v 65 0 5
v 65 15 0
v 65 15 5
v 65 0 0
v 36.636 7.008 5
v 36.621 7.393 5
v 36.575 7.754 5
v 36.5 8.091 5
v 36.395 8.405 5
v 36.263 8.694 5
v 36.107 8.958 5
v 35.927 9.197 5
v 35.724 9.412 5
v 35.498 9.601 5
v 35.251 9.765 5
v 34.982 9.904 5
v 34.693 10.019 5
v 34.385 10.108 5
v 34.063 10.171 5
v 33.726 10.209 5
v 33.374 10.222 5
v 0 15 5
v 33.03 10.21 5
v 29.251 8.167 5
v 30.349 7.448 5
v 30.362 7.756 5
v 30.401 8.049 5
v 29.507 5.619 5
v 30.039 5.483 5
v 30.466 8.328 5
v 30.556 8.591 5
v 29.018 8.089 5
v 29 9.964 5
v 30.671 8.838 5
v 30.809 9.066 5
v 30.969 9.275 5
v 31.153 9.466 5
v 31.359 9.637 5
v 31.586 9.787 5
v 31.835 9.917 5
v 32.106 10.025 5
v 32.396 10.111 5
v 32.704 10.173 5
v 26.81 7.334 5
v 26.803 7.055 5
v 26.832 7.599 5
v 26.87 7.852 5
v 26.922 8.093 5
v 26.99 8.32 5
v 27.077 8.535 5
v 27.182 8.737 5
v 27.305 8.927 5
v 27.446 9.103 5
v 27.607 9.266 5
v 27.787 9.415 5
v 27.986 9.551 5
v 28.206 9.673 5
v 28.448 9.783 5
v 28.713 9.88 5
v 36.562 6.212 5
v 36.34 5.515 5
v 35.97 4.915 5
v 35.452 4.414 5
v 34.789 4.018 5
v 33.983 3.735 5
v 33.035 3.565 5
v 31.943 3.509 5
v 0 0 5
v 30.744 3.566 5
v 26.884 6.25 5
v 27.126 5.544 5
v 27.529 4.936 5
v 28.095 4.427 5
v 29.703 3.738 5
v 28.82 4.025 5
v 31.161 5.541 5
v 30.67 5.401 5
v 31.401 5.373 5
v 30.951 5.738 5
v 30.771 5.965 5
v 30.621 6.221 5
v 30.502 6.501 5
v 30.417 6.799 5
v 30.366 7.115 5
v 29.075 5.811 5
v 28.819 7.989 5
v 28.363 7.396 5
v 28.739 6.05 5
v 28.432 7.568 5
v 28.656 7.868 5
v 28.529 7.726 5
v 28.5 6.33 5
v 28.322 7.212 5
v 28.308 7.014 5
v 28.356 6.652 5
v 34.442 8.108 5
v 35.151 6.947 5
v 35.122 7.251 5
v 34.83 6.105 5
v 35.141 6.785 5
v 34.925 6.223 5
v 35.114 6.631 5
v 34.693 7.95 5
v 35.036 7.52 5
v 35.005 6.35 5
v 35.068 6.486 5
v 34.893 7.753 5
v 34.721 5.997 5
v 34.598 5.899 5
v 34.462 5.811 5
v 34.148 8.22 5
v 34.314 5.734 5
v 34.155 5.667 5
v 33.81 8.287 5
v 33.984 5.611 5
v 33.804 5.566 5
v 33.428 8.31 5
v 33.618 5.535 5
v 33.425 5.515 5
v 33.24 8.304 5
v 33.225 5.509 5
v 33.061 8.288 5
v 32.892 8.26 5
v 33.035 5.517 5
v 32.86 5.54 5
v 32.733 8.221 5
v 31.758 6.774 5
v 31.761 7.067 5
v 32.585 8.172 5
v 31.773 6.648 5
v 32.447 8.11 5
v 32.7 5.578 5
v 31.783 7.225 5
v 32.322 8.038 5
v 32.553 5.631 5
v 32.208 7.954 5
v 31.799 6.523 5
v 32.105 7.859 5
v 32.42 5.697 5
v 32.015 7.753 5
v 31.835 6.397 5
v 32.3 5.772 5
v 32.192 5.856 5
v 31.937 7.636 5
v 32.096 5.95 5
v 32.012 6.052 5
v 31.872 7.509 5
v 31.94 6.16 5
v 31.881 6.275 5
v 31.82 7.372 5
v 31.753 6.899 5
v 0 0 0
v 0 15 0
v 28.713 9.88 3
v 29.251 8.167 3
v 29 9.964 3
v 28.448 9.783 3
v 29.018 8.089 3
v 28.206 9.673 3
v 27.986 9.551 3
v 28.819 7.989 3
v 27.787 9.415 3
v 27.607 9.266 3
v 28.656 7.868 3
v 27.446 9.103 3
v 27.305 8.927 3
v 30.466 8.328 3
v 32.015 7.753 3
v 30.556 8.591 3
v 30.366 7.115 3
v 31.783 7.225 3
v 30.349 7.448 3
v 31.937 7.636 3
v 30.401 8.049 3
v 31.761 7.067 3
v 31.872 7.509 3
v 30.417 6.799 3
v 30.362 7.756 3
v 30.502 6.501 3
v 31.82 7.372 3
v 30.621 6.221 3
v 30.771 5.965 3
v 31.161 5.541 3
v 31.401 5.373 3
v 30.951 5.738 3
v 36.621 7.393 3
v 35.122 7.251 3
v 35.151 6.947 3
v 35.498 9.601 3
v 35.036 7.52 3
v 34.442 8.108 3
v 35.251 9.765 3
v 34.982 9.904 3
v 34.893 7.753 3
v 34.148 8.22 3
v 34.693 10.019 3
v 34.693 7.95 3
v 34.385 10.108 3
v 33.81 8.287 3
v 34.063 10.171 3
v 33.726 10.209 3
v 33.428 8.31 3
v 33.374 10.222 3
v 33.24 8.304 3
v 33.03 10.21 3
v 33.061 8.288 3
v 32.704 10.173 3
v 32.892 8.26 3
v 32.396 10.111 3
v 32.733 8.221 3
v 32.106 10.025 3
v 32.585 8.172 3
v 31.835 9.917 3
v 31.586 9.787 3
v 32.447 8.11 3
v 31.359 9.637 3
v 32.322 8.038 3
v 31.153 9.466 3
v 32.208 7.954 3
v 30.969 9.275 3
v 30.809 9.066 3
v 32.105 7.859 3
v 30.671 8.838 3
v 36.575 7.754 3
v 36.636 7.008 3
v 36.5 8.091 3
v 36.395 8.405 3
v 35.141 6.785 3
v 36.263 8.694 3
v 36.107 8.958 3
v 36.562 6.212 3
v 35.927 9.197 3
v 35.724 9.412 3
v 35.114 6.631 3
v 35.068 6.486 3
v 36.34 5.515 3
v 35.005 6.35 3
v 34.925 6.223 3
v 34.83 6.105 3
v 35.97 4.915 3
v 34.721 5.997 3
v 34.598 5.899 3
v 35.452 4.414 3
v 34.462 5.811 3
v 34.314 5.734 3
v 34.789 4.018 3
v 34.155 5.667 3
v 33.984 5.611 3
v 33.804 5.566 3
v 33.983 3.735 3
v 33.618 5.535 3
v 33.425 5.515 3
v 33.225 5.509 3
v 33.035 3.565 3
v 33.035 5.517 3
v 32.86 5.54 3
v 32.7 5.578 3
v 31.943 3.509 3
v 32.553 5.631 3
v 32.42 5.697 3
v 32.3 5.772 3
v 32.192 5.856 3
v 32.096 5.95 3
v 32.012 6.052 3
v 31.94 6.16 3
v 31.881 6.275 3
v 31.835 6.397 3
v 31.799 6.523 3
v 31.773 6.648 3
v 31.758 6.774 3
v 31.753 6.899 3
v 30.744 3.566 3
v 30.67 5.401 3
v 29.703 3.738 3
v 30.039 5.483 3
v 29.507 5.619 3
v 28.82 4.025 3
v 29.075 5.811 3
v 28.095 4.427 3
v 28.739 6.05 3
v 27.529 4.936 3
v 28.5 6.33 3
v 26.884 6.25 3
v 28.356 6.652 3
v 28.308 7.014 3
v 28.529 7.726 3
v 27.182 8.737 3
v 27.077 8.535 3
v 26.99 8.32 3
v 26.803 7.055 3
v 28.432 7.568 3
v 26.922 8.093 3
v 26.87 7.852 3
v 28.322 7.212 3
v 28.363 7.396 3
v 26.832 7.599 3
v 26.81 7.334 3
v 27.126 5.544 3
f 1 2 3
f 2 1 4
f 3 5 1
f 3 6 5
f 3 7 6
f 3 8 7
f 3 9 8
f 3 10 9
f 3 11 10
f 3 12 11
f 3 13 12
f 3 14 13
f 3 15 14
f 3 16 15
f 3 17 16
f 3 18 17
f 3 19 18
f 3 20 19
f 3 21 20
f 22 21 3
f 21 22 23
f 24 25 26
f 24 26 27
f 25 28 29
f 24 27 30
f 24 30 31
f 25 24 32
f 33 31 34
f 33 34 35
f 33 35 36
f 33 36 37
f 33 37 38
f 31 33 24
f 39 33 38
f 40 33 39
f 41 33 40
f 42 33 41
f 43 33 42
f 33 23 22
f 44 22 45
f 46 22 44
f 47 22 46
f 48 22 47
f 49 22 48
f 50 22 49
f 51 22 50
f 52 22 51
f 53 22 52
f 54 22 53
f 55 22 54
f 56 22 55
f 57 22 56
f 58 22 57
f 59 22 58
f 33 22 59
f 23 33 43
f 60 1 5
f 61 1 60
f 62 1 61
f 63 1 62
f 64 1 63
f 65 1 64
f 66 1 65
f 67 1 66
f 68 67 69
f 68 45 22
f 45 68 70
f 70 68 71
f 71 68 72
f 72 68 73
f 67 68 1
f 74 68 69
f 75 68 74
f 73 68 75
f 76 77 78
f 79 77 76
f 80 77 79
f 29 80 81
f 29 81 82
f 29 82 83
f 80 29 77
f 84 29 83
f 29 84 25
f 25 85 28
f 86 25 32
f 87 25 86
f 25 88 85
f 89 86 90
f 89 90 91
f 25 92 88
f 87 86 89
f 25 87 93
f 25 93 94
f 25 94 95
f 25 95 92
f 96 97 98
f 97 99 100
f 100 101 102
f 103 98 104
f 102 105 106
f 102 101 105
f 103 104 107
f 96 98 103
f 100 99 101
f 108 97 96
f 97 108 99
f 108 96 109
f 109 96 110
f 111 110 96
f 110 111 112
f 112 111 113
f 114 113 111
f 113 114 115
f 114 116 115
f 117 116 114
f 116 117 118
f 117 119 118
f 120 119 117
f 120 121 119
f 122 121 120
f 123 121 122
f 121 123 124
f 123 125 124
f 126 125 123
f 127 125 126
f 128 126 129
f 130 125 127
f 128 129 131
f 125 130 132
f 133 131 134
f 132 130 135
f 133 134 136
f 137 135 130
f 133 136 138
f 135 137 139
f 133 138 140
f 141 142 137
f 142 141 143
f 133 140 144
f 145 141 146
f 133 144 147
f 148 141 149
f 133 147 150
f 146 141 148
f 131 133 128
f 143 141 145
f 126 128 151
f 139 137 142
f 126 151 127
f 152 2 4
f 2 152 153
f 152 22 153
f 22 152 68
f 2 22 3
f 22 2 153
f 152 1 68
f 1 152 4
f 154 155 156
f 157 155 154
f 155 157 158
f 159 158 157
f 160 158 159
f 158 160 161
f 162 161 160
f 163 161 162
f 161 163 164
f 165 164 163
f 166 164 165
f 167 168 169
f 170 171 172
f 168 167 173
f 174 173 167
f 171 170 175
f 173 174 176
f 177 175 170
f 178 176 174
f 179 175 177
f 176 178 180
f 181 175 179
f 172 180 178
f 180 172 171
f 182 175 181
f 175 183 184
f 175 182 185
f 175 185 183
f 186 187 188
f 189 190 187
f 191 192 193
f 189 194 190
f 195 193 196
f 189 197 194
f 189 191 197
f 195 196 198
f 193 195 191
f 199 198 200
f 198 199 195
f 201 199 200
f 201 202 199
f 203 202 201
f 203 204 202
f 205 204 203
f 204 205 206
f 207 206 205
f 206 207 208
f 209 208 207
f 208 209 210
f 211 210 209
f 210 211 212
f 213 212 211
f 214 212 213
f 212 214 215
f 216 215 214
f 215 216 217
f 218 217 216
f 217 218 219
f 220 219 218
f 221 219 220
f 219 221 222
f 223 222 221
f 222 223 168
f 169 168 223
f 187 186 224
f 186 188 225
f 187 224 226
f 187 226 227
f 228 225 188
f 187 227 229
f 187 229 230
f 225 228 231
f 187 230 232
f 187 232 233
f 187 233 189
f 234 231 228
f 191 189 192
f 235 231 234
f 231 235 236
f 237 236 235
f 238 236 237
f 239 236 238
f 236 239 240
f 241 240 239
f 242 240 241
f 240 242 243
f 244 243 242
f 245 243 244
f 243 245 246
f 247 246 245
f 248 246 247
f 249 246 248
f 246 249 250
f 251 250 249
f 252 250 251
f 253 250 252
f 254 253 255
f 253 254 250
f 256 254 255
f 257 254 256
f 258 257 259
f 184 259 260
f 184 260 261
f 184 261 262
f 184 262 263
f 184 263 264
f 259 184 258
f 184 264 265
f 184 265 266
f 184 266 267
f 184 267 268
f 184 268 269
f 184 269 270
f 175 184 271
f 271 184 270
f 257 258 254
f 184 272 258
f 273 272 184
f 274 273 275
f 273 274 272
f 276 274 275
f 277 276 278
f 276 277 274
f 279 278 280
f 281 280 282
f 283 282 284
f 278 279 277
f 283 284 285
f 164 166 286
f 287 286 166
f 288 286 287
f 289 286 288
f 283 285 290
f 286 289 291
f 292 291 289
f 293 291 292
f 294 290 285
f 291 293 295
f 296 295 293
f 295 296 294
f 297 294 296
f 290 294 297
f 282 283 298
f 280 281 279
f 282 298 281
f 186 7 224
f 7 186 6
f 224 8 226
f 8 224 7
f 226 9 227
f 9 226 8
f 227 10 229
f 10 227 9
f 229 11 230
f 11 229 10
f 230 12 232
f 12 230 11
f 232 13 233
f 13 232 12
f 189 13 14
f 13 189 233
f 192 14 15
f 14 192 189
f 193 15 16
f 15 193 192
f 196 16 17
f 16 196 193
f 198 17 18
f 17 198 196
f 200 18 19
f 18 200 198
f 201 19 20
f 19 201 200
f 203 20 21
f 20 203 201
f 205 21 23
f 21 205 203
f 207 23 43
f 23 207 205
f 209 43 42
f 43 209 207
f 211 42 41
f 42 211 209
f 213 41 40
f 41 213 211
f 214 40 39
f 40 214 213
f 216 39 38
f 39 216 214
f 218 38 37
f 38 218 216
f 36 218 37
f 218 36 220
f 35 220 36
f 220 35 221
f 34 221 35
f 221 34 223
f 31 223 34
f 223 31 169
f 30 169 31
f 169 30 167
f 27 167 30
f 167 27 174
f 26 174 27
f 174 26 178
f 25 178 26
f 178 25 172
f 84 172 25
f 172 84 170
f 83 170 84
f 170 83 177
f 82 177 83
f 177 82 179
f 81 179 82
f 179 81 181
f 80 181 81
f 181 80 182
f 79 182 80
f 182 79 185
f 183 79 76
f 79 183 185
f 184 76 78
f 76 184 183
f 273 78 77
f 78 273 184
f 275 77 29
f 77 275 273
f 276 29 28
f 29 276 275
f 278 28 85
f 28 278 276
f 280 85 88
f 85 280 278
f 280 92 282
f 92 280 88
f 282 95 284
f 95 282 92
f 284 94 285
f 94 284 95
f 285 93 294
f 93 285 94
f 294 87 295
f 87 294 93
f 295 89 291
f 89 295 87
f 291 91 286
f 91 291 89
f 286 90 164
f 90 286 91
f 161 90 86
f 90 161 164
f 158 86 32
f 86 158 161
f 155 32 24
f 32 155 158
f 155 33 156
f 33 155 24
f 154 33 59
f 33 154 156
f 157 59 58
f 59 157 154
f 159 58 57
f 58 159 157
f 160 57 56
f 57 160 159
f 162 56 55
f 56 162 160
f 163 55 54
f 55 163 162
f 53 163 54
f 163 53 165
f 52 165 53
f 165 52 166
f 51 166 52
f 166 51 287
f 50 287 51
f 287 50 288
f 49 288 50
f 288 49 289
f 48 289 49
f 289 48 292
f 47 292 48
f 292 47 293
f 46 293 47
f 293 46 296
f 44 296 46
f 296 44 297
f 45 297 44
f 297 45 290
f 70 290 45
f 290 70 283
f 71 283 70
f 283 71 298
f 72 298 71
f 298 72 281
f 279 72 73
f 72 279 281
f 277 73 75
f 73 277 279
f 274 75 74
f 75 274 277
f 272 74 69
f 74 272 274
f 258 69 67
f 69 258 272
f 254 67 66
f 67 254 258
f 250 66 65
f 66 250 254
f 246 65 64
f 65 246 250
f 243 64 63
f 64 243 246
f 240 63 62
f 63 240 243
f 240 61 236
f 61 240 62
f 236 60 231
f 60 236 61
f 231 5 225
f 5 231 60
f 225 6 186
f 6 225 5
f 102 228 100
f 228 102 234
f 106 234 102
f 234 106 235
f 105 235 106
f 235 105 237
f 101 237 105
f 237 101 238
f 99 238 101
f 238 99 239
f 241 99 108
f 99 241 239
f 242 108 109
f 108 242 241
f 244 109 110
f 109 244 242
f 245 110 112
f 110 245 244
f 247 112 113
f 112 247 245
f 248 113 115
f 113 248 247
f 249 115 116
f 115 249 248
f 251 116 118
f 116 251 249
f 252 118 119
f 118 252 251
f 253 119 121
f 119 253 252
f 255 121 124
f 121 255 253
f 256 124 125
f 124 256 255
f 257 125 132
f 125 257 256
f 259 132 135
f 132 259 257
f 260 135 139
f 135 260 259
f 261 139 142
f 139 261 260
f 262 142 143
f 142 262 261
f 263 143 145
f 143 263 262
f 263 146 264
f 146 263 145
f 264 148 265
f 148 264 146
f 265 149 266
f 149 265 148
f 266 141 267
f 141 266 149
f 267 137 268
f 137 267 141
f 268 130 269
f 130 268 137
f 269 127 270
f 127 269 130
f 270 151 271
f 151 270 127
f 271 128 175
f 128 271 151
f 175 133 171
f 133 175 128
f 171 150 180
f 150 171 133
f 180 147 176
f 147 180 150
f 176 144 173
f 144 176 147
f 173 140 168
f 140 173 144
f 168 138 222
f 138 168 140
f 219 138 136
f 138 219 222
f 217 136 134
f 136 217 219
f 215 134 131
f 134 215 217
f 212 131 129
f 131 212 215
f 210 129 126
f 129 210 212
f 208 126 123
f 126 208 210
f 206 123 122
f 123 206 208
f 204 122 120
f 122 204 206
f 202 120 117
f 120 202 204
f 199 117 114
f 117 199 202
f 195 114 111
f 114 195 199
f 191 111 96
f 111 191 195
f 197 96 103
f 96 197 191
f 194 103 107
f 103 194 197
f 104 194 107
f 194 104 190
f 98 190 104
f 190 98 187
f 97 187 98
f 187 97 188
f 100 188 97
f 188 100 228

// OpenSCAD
difference(){
	union(){ 
        translate([0,0,0]){
           cube([65,15,5], center=false);
        }                
	}
	union() {
        translate([60-65/2+9, 3,3]){
            linear_extrude(height = 10) {
                rotate([0,0,90]){
                    text("6", size = 10, font="Arial:style=Bold");
                }
            }
        }                


	}
}
